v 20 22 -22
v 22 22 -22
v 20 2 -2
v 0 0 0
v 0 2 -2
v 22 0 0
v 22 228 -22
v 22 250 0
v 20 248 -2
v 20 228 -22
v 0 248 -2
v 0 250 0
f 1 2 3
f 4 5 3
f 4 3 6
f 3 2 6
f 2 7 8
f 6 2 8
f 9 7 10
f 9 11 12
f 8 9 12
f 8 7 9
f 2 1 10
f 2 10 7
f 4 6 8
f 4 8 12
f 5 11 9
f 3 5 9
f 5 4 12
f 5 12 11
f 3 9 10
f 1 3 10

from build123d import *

# Parameters (mm, degrees)
EXTRUDE_1_DEPTH     = 250
CUT_EXTRUDE_1_DEPTH = 250


with BuildPart() as part:
    # Эскиз1 → Бобышка-Вытянуть1 (new body)
    with BuildSketch(Plane(origin=(0, 0, 0), x_dir=(1, 0, 0), z_dir=(0, 1, 0))):
        Polygon((0, 0), (0, 2), (20, 2), (20, 22), (22, 22), (22, 0), align=None)
    extrude(amount=EXTRUDE_1_DEPTH)

    # Эскиз3 → Вырез-Вытянуть1 (cut)
    with BuildSketch(Plane(origin=(22, 0, 0), x_dir=(0, 0, -1), z_dir=(1, 0, 0))):
        Polygon((0, 0), (22, 0), (22, 22), align=None)
        Polygon((22, 250), (22, 228), (0, 250), align=None)
    extrude(amount=-CUT_EXTRUDE_1_DEPTH, mode=Mode.SUBTRACT)


solid = part.part
